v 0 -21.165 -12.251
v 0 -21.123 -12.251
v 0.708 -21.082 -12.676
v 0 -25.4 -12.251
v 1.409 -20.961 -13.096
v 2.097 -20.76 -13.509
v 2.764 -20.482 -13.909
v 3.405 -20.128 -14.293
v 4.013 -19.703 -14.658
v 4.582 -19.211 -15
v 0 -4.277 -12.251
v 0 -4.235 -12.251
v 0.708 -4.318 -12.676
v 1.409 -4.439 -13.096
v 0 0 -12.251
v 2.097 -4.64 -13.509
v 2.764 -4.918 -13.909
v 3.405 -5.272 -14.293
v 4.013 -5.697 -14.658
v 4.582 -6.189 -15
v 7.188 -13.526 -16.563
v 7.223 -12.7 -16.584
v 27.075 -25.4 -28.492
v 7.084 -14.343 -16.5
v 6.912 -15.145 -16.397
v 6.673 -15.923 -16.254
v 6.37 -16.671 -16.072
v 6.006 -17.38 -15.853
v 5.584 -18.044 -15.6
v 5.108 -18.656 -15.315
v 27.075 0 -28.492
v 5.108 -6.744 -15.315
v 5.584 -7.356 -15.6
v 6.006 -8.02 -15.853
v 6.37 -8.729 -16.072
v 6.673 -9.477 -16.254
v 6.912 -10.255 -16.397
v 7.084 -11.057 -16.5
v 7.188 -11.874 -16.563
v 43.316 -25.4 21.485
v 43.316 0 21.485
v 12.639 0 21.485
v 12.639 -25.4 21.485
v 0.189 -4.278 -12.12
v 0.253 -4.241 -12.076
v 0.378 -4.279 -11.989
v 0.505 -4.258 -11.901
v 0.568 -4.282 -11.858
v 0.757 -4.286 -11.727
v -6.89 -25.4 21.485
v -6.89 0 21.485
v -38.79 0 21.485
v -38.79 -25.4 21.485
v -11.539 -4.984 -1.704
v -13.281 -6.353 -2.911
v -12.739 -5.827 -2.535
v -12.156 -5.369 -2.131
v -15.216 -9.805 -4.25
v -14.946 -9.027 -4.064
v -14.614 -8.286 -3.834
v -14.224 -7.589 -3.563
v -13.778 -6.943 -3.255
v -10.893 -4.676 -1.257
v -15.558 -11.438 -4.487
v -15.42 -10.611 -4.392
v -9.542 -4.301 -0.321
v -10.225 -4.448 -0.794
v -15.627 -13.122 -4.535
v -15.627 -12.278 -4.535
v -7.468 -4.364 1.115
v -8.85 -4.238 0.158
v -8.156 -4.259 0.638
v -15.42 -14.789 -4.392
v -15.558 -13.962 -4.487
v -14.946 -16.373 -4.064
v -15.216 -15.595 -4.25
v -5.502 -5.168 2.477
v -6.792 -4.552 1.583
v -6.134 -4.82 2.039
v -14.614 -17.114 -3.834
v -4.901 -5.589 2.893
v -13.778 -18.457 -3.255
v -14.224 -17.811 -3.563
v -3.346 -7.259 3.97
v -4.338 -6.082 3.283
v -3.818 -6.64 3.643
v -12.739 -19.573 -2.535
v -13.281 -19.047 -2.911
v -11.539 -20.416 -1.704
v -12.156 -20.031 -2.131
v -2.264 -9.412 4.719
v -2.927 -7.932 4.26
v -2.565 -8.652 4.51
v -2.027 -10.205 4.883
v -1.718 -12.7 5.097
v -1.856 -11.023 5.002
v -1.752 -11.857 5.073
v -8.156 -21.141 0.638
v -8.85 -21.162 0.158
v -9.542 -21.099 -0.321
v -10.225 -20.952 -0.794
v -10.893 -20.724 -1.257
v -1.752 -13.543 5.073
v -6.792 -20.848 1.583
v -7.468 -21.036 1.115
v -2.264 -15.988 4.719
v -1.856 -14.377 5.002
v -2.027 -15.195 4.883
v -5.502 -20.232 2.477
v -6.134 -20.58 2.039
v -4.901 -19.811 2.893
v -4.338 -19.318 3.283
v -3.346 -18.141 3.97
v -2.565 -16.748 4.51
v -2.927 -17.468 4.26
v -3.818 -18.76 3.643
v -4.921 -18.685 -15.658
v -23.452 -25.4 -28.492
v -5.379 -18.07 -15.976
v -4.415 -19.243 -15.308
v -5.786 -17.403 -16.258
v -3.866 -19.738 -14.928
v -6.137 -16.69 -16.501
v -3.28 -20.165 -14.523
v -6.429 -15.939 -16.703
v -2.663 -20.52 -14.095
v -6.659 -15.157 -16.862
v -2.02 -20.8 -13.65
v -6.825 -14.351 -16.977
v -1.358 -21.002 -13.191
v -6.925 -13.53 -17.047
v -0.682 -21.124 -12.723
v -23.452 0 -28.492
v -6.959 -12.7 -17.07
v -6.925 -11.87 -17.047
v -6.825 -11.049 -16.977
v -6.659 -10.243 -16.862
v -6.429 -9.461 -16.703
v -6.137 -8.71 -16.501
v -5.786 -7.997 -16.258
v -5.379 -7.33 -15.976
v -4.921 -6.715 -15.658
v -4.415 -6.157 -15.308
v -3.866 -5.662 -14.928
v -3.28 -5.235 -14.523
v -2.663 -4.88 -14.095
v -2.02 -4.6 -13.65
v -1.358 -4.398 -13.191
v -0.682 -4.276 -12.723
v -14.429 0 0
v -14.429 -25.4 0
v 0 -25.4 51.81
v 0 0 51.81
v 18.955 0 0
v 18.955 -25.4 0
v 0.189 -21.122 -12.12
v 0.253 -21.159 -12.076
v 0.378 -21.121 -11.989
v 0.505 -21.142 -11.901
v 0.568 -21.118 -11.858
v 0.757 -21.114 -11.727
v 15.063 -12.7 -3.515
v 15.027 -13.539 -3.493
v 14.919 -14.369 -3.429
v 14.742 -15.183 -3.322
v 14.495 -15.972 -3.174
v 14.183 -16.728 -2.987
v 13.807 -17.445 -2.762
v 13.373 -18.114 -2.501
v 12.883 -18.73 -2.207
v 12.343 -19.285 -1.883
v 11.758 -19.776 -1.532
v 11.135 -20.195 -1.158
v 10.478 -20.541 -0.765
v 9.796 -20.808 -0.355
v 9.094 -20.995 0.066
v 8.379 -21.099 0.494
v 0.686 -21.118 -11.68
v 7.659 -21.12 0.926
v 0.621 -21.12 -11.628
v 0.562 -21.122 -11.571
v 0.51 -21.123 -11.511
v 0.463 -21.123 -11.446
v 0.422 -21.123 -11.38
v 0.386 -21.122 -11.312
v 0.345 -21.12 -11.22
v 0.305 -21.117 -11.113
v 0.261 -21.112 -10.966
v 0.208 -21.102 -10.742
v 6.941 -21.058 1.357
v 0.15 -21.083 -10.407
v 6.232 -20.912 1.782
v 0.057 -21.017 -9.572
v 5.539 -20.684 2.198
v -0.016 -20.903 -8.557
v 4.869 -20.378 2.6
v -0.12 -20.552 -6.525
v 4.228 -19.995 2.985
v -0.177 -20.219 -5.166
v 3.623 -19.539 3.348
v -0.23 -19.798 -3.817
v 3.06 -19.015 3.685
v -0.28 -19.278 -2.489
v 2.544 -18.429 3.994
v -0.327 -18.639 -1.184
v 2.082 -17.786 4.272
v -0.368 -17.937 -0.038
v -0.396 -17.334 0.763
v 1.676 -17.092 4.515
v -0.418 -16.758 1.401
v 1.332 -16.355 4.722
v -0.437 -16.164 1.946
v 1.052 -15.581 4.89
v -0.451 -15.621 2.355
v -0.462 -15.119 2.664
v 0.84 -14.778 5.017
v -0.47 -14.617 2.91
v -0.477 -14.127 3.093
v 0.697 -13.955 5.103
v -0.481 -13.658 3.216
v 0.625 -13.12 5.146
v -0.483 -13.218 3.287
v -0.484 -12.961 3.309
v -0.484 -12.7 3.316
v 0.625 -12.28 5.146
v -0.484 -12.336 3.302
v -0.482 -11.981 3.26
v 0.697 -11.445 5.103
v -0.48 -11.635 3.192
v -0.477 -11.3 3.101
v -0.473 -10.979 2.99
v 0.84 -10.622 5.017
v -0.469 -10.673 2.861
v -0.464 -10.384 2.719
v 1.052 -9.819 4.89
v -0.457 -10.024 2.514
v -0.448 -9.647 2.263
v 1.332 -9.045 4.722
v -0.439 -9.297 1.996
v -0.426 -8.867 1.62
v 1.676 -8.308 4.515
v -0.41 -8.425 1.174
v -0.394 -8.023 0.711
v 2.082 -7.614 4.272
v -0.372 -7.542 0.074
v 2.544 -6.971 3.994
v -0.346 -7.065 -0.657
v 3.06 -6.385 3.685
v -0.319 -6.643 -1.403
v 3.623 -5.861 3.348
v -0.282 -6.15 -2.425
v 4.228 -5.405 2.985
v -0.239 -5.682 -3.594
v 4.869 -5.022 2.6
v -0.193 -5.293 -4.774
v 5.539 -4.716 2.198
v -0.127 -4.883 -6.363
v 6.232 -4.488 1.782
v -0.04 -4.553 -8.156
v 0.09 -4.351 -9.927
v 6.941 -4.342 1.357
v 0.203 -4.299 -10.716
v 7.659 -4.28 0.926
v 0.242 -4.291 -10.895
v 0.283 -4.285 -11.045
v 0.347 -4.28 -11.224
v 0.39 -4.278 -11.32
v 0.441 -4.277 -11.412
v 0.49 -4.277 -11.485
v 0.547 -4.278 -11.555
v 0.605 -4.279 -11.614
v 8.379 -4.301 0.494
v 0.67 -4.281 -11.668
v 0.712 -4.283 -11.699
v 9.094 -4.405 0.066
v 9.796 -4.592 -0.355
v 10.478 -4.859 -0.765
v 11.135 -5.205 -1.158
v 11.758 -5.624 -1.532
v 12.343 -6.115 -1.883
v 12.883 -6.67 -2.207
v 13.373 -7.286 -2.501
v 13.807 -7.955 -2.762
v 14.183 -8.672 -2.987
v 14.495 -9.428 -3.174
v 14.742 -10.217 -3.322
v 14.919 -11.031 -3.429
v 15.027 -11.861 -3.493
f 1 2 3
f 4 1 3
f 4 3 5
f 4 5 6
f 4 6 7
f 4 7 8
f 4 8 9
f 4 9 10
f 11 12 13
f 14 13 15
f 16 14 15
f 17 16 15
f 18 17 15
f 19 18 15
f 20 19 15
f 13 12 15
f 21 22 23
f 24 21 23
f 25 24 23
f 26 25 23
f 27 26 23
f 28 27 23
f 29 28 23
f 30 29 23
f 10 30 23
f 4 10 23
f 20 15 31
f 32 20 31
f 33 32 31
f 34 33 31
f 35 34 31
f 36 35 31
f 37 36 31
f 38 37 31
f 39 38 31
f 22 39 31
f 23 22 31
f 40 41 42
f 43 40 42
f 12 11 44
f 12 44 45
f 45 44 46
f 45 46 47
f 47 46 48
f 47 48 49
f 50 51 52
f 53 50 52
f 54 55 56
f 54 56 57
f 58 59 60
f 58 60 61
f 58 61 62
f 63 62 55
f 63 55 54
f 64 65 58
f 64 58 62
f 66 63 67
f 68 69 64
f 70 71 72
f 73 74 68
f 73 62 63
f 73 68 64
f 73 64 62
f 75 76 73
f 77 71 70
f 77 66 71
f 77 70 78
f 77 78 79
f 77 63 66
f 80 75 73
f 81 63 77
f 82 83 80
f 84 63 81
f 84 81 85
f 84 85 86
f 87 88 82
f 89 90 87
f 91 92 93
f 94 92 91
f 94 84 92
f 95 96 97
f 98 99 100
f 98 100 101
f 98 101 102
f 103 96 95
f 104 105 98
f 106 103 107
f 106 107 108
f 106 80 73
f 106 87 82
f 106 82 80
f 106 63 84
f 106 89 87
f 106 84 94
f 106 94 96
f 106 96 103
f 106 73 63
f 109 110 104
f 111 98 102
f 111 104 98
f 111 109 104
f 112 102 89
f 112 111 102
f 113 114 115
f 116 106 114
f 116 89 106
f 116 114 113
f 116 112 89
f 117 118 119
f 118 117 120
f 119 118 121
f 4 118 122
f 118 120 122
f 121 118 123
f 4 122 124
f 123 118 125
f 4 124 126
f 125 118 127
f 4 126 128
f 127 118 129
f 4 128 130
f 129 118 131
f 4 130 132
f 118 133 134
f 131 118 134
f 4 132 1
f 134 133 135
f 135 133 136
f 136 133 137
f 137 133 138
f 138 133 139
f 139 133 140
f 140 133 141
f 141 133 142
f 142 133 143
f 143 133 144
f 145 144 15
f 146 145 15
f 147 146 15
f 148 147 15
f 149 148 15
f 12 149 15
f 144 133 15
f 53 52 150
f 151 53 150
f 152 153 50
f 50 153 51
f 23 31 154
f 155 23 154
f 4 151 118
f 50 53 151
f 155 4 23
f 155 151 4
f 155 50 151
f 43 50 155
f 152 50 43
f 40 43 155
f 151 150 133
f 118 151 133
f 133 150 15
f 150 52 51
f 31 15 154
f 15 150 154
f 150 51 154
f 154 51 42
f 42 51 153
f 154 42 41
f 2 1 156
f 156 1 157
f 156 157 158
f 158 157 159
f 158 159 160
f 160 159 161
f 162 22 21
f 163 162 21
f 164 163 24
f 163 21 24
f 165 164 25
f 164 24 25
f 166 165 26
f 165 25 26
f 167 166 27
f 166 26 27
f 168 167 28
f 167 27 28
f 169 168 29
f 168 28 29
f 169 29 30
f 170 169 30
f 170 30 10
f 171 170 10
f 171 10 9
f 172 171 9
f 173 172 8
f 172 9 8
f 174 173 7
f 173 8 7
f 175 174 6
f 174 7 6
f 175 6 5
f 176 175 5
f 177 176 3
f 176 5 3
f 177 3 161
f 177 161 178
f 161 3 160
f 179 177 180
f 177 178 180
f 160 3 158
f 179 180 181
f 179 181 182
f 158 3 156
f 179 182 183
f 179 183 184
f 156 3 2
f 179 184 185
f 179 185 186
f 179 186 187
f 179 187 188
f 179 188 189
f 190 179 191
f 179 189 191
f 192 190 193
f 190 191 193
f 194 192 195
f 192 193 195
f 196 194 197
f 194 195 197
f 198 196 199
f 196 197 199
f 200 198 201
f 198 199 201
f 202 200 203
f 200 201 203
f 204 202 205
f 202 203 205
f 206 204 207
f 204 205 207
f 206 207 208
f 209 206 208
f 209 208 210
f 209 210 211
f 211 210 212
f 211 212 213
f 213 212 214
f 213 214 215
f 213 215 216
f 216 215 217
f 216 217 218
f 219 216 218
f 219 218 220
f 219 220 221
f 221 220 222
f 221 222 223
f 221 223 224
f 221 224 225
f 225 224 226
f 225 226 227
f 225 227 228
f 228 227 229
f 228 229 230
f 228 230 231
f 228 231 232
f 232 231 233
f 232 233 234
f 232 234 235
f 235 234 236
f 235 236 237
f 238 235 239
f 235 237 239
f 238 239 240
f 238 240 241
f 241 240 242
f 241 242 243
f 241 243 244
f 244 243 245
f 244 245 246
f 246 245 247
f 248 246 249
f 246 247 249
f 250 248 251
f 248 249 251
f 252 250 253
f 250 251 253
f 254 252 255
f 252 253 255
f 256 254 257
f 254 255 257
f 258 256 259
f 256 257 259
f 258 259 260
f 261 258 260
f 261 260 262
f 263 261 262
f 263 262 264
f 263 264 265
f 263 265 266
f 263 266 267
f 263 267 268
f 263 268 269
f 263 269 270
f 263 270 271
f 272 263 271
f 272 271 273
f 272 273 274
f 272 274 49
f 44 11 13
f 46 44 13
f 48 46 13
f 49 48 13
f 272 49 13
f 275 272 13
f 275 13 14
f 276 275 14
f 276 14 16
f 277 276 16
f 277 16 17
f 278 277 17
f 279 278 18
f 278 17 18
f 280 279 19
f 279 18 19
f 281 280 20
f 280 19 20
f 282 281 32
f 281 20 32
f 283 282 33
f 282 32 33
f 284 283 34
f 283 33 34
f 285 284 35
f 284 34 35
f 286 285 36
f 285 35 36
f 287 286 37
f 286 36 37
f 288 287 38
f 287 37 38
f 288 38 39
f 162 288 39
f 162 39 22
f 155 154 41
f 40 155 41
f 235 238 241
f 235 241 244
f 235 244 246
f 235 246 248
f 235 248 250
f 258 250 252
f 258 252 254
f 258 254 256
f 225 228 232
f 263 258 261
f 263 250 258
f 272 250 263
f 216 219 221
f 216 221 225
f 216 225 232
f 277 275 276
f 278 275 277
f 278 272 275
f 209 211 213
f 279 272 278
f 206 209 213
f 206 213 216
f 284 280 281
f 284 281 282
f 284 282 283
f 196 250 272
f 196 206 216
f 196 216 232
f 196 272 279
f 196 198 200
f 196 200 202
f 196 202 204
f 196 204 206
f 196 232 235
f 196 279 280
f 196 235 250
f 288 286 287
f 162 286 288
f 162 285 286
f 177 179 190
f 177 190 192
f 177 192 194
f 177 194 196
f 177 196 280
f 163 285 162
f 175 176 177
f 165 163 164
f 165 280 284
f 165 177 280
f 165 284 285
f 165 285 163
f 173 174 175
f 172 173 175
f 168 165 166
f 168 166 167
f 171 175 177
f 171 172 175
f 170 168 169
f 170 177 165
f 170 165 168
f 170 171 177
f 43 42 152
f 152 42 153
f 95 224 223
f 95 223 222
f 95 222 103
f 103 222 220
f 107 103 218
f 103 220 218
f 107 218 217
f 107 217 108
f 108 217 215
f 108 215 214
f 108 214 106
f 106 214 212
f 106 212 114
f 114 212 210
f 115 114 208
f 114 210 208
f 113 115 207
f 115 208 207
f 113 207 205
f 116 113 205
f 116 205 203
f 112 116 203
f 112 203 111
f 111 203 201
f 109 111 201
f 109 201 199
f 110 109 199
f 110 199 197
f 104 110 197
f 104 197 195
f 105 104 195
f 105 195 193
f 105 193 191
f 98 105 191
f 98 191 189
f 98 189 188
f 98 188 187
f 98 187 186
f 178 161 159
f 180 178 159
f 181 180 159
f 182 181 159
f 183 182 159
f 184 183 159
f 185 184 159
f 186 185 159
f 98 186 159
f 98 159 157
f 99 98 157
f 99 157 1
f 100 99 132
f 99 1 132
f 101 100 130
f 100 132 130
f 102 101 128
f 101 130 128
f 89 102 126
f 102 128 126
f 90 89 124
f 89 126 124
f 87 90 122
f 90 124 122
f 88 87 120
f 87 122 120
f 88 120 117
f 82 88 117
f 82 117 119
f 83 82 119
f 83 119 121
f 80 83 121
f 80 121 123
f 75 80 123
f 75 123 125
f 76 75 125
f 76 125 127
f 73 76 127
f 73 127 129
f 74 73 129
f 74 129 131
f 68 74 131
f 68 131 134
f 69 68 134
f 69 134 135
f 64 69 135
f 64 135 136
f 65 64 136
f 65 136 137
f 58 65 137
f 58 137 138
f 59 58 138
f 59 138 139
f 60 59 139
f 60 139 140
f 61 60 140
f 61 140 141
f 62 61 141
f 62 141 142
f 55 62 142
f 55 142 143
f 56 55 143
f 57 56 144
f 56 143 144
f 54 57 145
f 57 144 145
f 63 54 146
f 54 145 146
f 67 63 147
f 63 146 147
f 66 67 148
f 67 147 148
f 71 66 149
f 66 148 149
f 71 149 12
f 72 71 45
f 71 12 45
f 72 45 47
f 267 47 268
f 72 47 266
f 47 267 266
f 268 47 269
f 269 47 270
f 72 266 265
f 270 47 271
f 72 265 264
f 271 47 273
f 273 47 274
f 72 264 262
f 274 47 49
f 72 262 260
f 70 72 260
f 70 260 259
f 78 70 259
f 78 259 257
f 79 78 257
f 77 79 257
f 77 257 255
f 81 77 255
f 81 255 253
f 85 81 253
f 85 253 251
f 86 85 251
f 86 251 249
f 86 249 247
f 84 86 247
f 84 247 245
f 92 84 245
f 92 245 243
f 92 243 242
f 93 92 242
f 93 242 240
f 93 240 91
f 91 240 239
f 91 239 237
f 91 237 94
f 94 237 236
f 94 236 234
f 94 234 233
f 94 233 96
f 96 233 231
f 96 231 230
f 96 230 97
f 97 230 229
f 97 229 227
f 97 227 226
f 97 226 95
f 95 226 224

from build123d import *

# Parameters (mm, degrees)
F1_DEPTH = 25.4
F2_R     = 8.4230292531
F3_DEPTH = 15.24
F4_R     = 8.4646694798
F5_DEPTH = 15.24


with BuildPart() as f1:
    # F0 (on Front) → F1 (new body)
    with BuildSketch(Plane.XZ):
        Polygon((0, 51.8097877502), (-6.8899182792, 21.4846514834), (-38.7902185321, 21.4846514834), (-14.4291445613, 0), (-23.4517641366, -28.4915324301), (0, -12.2508164495), (27.0749107003, -28.4915324301), (18.9545508474, 0), (43.3156266809, 21.4846514834), (12.6387169585, 21.4846514834), align=None)
    extrude(amount=F1_DEPTH)

    # F2 (on face) → F3 (cut)
    with BuildSketch(Plane(origin=(-5.4041094275, 0, -9.0091951821), x_dir=(0.8575520342, 0, -0.5143972285), z_dir=(-0.5143972285, 0, -0.8575520342))):
        with Locations((6.3017860283, 12.7)):
            Circle(F2_R)
    extrude(amount=-F3_DEPTH, mode=Mode.SUBTRACT)

    # F4 (on face) → F5 (cut)
    with BuildSketch(Plane(origin=(5.7339883167, 0, -8.279939242), x_dir=(0.8221121344, 0, 0.5693255996), z_dir=(0.5693255996, 0, -0.8221121344))):
        with Locations((-6.9747034212, 12.7)):
            Circle(F4_R)
    extrude(amount=-F5_DEPTH, mode=Mode.SUBTRACT)


solid = f1.part
